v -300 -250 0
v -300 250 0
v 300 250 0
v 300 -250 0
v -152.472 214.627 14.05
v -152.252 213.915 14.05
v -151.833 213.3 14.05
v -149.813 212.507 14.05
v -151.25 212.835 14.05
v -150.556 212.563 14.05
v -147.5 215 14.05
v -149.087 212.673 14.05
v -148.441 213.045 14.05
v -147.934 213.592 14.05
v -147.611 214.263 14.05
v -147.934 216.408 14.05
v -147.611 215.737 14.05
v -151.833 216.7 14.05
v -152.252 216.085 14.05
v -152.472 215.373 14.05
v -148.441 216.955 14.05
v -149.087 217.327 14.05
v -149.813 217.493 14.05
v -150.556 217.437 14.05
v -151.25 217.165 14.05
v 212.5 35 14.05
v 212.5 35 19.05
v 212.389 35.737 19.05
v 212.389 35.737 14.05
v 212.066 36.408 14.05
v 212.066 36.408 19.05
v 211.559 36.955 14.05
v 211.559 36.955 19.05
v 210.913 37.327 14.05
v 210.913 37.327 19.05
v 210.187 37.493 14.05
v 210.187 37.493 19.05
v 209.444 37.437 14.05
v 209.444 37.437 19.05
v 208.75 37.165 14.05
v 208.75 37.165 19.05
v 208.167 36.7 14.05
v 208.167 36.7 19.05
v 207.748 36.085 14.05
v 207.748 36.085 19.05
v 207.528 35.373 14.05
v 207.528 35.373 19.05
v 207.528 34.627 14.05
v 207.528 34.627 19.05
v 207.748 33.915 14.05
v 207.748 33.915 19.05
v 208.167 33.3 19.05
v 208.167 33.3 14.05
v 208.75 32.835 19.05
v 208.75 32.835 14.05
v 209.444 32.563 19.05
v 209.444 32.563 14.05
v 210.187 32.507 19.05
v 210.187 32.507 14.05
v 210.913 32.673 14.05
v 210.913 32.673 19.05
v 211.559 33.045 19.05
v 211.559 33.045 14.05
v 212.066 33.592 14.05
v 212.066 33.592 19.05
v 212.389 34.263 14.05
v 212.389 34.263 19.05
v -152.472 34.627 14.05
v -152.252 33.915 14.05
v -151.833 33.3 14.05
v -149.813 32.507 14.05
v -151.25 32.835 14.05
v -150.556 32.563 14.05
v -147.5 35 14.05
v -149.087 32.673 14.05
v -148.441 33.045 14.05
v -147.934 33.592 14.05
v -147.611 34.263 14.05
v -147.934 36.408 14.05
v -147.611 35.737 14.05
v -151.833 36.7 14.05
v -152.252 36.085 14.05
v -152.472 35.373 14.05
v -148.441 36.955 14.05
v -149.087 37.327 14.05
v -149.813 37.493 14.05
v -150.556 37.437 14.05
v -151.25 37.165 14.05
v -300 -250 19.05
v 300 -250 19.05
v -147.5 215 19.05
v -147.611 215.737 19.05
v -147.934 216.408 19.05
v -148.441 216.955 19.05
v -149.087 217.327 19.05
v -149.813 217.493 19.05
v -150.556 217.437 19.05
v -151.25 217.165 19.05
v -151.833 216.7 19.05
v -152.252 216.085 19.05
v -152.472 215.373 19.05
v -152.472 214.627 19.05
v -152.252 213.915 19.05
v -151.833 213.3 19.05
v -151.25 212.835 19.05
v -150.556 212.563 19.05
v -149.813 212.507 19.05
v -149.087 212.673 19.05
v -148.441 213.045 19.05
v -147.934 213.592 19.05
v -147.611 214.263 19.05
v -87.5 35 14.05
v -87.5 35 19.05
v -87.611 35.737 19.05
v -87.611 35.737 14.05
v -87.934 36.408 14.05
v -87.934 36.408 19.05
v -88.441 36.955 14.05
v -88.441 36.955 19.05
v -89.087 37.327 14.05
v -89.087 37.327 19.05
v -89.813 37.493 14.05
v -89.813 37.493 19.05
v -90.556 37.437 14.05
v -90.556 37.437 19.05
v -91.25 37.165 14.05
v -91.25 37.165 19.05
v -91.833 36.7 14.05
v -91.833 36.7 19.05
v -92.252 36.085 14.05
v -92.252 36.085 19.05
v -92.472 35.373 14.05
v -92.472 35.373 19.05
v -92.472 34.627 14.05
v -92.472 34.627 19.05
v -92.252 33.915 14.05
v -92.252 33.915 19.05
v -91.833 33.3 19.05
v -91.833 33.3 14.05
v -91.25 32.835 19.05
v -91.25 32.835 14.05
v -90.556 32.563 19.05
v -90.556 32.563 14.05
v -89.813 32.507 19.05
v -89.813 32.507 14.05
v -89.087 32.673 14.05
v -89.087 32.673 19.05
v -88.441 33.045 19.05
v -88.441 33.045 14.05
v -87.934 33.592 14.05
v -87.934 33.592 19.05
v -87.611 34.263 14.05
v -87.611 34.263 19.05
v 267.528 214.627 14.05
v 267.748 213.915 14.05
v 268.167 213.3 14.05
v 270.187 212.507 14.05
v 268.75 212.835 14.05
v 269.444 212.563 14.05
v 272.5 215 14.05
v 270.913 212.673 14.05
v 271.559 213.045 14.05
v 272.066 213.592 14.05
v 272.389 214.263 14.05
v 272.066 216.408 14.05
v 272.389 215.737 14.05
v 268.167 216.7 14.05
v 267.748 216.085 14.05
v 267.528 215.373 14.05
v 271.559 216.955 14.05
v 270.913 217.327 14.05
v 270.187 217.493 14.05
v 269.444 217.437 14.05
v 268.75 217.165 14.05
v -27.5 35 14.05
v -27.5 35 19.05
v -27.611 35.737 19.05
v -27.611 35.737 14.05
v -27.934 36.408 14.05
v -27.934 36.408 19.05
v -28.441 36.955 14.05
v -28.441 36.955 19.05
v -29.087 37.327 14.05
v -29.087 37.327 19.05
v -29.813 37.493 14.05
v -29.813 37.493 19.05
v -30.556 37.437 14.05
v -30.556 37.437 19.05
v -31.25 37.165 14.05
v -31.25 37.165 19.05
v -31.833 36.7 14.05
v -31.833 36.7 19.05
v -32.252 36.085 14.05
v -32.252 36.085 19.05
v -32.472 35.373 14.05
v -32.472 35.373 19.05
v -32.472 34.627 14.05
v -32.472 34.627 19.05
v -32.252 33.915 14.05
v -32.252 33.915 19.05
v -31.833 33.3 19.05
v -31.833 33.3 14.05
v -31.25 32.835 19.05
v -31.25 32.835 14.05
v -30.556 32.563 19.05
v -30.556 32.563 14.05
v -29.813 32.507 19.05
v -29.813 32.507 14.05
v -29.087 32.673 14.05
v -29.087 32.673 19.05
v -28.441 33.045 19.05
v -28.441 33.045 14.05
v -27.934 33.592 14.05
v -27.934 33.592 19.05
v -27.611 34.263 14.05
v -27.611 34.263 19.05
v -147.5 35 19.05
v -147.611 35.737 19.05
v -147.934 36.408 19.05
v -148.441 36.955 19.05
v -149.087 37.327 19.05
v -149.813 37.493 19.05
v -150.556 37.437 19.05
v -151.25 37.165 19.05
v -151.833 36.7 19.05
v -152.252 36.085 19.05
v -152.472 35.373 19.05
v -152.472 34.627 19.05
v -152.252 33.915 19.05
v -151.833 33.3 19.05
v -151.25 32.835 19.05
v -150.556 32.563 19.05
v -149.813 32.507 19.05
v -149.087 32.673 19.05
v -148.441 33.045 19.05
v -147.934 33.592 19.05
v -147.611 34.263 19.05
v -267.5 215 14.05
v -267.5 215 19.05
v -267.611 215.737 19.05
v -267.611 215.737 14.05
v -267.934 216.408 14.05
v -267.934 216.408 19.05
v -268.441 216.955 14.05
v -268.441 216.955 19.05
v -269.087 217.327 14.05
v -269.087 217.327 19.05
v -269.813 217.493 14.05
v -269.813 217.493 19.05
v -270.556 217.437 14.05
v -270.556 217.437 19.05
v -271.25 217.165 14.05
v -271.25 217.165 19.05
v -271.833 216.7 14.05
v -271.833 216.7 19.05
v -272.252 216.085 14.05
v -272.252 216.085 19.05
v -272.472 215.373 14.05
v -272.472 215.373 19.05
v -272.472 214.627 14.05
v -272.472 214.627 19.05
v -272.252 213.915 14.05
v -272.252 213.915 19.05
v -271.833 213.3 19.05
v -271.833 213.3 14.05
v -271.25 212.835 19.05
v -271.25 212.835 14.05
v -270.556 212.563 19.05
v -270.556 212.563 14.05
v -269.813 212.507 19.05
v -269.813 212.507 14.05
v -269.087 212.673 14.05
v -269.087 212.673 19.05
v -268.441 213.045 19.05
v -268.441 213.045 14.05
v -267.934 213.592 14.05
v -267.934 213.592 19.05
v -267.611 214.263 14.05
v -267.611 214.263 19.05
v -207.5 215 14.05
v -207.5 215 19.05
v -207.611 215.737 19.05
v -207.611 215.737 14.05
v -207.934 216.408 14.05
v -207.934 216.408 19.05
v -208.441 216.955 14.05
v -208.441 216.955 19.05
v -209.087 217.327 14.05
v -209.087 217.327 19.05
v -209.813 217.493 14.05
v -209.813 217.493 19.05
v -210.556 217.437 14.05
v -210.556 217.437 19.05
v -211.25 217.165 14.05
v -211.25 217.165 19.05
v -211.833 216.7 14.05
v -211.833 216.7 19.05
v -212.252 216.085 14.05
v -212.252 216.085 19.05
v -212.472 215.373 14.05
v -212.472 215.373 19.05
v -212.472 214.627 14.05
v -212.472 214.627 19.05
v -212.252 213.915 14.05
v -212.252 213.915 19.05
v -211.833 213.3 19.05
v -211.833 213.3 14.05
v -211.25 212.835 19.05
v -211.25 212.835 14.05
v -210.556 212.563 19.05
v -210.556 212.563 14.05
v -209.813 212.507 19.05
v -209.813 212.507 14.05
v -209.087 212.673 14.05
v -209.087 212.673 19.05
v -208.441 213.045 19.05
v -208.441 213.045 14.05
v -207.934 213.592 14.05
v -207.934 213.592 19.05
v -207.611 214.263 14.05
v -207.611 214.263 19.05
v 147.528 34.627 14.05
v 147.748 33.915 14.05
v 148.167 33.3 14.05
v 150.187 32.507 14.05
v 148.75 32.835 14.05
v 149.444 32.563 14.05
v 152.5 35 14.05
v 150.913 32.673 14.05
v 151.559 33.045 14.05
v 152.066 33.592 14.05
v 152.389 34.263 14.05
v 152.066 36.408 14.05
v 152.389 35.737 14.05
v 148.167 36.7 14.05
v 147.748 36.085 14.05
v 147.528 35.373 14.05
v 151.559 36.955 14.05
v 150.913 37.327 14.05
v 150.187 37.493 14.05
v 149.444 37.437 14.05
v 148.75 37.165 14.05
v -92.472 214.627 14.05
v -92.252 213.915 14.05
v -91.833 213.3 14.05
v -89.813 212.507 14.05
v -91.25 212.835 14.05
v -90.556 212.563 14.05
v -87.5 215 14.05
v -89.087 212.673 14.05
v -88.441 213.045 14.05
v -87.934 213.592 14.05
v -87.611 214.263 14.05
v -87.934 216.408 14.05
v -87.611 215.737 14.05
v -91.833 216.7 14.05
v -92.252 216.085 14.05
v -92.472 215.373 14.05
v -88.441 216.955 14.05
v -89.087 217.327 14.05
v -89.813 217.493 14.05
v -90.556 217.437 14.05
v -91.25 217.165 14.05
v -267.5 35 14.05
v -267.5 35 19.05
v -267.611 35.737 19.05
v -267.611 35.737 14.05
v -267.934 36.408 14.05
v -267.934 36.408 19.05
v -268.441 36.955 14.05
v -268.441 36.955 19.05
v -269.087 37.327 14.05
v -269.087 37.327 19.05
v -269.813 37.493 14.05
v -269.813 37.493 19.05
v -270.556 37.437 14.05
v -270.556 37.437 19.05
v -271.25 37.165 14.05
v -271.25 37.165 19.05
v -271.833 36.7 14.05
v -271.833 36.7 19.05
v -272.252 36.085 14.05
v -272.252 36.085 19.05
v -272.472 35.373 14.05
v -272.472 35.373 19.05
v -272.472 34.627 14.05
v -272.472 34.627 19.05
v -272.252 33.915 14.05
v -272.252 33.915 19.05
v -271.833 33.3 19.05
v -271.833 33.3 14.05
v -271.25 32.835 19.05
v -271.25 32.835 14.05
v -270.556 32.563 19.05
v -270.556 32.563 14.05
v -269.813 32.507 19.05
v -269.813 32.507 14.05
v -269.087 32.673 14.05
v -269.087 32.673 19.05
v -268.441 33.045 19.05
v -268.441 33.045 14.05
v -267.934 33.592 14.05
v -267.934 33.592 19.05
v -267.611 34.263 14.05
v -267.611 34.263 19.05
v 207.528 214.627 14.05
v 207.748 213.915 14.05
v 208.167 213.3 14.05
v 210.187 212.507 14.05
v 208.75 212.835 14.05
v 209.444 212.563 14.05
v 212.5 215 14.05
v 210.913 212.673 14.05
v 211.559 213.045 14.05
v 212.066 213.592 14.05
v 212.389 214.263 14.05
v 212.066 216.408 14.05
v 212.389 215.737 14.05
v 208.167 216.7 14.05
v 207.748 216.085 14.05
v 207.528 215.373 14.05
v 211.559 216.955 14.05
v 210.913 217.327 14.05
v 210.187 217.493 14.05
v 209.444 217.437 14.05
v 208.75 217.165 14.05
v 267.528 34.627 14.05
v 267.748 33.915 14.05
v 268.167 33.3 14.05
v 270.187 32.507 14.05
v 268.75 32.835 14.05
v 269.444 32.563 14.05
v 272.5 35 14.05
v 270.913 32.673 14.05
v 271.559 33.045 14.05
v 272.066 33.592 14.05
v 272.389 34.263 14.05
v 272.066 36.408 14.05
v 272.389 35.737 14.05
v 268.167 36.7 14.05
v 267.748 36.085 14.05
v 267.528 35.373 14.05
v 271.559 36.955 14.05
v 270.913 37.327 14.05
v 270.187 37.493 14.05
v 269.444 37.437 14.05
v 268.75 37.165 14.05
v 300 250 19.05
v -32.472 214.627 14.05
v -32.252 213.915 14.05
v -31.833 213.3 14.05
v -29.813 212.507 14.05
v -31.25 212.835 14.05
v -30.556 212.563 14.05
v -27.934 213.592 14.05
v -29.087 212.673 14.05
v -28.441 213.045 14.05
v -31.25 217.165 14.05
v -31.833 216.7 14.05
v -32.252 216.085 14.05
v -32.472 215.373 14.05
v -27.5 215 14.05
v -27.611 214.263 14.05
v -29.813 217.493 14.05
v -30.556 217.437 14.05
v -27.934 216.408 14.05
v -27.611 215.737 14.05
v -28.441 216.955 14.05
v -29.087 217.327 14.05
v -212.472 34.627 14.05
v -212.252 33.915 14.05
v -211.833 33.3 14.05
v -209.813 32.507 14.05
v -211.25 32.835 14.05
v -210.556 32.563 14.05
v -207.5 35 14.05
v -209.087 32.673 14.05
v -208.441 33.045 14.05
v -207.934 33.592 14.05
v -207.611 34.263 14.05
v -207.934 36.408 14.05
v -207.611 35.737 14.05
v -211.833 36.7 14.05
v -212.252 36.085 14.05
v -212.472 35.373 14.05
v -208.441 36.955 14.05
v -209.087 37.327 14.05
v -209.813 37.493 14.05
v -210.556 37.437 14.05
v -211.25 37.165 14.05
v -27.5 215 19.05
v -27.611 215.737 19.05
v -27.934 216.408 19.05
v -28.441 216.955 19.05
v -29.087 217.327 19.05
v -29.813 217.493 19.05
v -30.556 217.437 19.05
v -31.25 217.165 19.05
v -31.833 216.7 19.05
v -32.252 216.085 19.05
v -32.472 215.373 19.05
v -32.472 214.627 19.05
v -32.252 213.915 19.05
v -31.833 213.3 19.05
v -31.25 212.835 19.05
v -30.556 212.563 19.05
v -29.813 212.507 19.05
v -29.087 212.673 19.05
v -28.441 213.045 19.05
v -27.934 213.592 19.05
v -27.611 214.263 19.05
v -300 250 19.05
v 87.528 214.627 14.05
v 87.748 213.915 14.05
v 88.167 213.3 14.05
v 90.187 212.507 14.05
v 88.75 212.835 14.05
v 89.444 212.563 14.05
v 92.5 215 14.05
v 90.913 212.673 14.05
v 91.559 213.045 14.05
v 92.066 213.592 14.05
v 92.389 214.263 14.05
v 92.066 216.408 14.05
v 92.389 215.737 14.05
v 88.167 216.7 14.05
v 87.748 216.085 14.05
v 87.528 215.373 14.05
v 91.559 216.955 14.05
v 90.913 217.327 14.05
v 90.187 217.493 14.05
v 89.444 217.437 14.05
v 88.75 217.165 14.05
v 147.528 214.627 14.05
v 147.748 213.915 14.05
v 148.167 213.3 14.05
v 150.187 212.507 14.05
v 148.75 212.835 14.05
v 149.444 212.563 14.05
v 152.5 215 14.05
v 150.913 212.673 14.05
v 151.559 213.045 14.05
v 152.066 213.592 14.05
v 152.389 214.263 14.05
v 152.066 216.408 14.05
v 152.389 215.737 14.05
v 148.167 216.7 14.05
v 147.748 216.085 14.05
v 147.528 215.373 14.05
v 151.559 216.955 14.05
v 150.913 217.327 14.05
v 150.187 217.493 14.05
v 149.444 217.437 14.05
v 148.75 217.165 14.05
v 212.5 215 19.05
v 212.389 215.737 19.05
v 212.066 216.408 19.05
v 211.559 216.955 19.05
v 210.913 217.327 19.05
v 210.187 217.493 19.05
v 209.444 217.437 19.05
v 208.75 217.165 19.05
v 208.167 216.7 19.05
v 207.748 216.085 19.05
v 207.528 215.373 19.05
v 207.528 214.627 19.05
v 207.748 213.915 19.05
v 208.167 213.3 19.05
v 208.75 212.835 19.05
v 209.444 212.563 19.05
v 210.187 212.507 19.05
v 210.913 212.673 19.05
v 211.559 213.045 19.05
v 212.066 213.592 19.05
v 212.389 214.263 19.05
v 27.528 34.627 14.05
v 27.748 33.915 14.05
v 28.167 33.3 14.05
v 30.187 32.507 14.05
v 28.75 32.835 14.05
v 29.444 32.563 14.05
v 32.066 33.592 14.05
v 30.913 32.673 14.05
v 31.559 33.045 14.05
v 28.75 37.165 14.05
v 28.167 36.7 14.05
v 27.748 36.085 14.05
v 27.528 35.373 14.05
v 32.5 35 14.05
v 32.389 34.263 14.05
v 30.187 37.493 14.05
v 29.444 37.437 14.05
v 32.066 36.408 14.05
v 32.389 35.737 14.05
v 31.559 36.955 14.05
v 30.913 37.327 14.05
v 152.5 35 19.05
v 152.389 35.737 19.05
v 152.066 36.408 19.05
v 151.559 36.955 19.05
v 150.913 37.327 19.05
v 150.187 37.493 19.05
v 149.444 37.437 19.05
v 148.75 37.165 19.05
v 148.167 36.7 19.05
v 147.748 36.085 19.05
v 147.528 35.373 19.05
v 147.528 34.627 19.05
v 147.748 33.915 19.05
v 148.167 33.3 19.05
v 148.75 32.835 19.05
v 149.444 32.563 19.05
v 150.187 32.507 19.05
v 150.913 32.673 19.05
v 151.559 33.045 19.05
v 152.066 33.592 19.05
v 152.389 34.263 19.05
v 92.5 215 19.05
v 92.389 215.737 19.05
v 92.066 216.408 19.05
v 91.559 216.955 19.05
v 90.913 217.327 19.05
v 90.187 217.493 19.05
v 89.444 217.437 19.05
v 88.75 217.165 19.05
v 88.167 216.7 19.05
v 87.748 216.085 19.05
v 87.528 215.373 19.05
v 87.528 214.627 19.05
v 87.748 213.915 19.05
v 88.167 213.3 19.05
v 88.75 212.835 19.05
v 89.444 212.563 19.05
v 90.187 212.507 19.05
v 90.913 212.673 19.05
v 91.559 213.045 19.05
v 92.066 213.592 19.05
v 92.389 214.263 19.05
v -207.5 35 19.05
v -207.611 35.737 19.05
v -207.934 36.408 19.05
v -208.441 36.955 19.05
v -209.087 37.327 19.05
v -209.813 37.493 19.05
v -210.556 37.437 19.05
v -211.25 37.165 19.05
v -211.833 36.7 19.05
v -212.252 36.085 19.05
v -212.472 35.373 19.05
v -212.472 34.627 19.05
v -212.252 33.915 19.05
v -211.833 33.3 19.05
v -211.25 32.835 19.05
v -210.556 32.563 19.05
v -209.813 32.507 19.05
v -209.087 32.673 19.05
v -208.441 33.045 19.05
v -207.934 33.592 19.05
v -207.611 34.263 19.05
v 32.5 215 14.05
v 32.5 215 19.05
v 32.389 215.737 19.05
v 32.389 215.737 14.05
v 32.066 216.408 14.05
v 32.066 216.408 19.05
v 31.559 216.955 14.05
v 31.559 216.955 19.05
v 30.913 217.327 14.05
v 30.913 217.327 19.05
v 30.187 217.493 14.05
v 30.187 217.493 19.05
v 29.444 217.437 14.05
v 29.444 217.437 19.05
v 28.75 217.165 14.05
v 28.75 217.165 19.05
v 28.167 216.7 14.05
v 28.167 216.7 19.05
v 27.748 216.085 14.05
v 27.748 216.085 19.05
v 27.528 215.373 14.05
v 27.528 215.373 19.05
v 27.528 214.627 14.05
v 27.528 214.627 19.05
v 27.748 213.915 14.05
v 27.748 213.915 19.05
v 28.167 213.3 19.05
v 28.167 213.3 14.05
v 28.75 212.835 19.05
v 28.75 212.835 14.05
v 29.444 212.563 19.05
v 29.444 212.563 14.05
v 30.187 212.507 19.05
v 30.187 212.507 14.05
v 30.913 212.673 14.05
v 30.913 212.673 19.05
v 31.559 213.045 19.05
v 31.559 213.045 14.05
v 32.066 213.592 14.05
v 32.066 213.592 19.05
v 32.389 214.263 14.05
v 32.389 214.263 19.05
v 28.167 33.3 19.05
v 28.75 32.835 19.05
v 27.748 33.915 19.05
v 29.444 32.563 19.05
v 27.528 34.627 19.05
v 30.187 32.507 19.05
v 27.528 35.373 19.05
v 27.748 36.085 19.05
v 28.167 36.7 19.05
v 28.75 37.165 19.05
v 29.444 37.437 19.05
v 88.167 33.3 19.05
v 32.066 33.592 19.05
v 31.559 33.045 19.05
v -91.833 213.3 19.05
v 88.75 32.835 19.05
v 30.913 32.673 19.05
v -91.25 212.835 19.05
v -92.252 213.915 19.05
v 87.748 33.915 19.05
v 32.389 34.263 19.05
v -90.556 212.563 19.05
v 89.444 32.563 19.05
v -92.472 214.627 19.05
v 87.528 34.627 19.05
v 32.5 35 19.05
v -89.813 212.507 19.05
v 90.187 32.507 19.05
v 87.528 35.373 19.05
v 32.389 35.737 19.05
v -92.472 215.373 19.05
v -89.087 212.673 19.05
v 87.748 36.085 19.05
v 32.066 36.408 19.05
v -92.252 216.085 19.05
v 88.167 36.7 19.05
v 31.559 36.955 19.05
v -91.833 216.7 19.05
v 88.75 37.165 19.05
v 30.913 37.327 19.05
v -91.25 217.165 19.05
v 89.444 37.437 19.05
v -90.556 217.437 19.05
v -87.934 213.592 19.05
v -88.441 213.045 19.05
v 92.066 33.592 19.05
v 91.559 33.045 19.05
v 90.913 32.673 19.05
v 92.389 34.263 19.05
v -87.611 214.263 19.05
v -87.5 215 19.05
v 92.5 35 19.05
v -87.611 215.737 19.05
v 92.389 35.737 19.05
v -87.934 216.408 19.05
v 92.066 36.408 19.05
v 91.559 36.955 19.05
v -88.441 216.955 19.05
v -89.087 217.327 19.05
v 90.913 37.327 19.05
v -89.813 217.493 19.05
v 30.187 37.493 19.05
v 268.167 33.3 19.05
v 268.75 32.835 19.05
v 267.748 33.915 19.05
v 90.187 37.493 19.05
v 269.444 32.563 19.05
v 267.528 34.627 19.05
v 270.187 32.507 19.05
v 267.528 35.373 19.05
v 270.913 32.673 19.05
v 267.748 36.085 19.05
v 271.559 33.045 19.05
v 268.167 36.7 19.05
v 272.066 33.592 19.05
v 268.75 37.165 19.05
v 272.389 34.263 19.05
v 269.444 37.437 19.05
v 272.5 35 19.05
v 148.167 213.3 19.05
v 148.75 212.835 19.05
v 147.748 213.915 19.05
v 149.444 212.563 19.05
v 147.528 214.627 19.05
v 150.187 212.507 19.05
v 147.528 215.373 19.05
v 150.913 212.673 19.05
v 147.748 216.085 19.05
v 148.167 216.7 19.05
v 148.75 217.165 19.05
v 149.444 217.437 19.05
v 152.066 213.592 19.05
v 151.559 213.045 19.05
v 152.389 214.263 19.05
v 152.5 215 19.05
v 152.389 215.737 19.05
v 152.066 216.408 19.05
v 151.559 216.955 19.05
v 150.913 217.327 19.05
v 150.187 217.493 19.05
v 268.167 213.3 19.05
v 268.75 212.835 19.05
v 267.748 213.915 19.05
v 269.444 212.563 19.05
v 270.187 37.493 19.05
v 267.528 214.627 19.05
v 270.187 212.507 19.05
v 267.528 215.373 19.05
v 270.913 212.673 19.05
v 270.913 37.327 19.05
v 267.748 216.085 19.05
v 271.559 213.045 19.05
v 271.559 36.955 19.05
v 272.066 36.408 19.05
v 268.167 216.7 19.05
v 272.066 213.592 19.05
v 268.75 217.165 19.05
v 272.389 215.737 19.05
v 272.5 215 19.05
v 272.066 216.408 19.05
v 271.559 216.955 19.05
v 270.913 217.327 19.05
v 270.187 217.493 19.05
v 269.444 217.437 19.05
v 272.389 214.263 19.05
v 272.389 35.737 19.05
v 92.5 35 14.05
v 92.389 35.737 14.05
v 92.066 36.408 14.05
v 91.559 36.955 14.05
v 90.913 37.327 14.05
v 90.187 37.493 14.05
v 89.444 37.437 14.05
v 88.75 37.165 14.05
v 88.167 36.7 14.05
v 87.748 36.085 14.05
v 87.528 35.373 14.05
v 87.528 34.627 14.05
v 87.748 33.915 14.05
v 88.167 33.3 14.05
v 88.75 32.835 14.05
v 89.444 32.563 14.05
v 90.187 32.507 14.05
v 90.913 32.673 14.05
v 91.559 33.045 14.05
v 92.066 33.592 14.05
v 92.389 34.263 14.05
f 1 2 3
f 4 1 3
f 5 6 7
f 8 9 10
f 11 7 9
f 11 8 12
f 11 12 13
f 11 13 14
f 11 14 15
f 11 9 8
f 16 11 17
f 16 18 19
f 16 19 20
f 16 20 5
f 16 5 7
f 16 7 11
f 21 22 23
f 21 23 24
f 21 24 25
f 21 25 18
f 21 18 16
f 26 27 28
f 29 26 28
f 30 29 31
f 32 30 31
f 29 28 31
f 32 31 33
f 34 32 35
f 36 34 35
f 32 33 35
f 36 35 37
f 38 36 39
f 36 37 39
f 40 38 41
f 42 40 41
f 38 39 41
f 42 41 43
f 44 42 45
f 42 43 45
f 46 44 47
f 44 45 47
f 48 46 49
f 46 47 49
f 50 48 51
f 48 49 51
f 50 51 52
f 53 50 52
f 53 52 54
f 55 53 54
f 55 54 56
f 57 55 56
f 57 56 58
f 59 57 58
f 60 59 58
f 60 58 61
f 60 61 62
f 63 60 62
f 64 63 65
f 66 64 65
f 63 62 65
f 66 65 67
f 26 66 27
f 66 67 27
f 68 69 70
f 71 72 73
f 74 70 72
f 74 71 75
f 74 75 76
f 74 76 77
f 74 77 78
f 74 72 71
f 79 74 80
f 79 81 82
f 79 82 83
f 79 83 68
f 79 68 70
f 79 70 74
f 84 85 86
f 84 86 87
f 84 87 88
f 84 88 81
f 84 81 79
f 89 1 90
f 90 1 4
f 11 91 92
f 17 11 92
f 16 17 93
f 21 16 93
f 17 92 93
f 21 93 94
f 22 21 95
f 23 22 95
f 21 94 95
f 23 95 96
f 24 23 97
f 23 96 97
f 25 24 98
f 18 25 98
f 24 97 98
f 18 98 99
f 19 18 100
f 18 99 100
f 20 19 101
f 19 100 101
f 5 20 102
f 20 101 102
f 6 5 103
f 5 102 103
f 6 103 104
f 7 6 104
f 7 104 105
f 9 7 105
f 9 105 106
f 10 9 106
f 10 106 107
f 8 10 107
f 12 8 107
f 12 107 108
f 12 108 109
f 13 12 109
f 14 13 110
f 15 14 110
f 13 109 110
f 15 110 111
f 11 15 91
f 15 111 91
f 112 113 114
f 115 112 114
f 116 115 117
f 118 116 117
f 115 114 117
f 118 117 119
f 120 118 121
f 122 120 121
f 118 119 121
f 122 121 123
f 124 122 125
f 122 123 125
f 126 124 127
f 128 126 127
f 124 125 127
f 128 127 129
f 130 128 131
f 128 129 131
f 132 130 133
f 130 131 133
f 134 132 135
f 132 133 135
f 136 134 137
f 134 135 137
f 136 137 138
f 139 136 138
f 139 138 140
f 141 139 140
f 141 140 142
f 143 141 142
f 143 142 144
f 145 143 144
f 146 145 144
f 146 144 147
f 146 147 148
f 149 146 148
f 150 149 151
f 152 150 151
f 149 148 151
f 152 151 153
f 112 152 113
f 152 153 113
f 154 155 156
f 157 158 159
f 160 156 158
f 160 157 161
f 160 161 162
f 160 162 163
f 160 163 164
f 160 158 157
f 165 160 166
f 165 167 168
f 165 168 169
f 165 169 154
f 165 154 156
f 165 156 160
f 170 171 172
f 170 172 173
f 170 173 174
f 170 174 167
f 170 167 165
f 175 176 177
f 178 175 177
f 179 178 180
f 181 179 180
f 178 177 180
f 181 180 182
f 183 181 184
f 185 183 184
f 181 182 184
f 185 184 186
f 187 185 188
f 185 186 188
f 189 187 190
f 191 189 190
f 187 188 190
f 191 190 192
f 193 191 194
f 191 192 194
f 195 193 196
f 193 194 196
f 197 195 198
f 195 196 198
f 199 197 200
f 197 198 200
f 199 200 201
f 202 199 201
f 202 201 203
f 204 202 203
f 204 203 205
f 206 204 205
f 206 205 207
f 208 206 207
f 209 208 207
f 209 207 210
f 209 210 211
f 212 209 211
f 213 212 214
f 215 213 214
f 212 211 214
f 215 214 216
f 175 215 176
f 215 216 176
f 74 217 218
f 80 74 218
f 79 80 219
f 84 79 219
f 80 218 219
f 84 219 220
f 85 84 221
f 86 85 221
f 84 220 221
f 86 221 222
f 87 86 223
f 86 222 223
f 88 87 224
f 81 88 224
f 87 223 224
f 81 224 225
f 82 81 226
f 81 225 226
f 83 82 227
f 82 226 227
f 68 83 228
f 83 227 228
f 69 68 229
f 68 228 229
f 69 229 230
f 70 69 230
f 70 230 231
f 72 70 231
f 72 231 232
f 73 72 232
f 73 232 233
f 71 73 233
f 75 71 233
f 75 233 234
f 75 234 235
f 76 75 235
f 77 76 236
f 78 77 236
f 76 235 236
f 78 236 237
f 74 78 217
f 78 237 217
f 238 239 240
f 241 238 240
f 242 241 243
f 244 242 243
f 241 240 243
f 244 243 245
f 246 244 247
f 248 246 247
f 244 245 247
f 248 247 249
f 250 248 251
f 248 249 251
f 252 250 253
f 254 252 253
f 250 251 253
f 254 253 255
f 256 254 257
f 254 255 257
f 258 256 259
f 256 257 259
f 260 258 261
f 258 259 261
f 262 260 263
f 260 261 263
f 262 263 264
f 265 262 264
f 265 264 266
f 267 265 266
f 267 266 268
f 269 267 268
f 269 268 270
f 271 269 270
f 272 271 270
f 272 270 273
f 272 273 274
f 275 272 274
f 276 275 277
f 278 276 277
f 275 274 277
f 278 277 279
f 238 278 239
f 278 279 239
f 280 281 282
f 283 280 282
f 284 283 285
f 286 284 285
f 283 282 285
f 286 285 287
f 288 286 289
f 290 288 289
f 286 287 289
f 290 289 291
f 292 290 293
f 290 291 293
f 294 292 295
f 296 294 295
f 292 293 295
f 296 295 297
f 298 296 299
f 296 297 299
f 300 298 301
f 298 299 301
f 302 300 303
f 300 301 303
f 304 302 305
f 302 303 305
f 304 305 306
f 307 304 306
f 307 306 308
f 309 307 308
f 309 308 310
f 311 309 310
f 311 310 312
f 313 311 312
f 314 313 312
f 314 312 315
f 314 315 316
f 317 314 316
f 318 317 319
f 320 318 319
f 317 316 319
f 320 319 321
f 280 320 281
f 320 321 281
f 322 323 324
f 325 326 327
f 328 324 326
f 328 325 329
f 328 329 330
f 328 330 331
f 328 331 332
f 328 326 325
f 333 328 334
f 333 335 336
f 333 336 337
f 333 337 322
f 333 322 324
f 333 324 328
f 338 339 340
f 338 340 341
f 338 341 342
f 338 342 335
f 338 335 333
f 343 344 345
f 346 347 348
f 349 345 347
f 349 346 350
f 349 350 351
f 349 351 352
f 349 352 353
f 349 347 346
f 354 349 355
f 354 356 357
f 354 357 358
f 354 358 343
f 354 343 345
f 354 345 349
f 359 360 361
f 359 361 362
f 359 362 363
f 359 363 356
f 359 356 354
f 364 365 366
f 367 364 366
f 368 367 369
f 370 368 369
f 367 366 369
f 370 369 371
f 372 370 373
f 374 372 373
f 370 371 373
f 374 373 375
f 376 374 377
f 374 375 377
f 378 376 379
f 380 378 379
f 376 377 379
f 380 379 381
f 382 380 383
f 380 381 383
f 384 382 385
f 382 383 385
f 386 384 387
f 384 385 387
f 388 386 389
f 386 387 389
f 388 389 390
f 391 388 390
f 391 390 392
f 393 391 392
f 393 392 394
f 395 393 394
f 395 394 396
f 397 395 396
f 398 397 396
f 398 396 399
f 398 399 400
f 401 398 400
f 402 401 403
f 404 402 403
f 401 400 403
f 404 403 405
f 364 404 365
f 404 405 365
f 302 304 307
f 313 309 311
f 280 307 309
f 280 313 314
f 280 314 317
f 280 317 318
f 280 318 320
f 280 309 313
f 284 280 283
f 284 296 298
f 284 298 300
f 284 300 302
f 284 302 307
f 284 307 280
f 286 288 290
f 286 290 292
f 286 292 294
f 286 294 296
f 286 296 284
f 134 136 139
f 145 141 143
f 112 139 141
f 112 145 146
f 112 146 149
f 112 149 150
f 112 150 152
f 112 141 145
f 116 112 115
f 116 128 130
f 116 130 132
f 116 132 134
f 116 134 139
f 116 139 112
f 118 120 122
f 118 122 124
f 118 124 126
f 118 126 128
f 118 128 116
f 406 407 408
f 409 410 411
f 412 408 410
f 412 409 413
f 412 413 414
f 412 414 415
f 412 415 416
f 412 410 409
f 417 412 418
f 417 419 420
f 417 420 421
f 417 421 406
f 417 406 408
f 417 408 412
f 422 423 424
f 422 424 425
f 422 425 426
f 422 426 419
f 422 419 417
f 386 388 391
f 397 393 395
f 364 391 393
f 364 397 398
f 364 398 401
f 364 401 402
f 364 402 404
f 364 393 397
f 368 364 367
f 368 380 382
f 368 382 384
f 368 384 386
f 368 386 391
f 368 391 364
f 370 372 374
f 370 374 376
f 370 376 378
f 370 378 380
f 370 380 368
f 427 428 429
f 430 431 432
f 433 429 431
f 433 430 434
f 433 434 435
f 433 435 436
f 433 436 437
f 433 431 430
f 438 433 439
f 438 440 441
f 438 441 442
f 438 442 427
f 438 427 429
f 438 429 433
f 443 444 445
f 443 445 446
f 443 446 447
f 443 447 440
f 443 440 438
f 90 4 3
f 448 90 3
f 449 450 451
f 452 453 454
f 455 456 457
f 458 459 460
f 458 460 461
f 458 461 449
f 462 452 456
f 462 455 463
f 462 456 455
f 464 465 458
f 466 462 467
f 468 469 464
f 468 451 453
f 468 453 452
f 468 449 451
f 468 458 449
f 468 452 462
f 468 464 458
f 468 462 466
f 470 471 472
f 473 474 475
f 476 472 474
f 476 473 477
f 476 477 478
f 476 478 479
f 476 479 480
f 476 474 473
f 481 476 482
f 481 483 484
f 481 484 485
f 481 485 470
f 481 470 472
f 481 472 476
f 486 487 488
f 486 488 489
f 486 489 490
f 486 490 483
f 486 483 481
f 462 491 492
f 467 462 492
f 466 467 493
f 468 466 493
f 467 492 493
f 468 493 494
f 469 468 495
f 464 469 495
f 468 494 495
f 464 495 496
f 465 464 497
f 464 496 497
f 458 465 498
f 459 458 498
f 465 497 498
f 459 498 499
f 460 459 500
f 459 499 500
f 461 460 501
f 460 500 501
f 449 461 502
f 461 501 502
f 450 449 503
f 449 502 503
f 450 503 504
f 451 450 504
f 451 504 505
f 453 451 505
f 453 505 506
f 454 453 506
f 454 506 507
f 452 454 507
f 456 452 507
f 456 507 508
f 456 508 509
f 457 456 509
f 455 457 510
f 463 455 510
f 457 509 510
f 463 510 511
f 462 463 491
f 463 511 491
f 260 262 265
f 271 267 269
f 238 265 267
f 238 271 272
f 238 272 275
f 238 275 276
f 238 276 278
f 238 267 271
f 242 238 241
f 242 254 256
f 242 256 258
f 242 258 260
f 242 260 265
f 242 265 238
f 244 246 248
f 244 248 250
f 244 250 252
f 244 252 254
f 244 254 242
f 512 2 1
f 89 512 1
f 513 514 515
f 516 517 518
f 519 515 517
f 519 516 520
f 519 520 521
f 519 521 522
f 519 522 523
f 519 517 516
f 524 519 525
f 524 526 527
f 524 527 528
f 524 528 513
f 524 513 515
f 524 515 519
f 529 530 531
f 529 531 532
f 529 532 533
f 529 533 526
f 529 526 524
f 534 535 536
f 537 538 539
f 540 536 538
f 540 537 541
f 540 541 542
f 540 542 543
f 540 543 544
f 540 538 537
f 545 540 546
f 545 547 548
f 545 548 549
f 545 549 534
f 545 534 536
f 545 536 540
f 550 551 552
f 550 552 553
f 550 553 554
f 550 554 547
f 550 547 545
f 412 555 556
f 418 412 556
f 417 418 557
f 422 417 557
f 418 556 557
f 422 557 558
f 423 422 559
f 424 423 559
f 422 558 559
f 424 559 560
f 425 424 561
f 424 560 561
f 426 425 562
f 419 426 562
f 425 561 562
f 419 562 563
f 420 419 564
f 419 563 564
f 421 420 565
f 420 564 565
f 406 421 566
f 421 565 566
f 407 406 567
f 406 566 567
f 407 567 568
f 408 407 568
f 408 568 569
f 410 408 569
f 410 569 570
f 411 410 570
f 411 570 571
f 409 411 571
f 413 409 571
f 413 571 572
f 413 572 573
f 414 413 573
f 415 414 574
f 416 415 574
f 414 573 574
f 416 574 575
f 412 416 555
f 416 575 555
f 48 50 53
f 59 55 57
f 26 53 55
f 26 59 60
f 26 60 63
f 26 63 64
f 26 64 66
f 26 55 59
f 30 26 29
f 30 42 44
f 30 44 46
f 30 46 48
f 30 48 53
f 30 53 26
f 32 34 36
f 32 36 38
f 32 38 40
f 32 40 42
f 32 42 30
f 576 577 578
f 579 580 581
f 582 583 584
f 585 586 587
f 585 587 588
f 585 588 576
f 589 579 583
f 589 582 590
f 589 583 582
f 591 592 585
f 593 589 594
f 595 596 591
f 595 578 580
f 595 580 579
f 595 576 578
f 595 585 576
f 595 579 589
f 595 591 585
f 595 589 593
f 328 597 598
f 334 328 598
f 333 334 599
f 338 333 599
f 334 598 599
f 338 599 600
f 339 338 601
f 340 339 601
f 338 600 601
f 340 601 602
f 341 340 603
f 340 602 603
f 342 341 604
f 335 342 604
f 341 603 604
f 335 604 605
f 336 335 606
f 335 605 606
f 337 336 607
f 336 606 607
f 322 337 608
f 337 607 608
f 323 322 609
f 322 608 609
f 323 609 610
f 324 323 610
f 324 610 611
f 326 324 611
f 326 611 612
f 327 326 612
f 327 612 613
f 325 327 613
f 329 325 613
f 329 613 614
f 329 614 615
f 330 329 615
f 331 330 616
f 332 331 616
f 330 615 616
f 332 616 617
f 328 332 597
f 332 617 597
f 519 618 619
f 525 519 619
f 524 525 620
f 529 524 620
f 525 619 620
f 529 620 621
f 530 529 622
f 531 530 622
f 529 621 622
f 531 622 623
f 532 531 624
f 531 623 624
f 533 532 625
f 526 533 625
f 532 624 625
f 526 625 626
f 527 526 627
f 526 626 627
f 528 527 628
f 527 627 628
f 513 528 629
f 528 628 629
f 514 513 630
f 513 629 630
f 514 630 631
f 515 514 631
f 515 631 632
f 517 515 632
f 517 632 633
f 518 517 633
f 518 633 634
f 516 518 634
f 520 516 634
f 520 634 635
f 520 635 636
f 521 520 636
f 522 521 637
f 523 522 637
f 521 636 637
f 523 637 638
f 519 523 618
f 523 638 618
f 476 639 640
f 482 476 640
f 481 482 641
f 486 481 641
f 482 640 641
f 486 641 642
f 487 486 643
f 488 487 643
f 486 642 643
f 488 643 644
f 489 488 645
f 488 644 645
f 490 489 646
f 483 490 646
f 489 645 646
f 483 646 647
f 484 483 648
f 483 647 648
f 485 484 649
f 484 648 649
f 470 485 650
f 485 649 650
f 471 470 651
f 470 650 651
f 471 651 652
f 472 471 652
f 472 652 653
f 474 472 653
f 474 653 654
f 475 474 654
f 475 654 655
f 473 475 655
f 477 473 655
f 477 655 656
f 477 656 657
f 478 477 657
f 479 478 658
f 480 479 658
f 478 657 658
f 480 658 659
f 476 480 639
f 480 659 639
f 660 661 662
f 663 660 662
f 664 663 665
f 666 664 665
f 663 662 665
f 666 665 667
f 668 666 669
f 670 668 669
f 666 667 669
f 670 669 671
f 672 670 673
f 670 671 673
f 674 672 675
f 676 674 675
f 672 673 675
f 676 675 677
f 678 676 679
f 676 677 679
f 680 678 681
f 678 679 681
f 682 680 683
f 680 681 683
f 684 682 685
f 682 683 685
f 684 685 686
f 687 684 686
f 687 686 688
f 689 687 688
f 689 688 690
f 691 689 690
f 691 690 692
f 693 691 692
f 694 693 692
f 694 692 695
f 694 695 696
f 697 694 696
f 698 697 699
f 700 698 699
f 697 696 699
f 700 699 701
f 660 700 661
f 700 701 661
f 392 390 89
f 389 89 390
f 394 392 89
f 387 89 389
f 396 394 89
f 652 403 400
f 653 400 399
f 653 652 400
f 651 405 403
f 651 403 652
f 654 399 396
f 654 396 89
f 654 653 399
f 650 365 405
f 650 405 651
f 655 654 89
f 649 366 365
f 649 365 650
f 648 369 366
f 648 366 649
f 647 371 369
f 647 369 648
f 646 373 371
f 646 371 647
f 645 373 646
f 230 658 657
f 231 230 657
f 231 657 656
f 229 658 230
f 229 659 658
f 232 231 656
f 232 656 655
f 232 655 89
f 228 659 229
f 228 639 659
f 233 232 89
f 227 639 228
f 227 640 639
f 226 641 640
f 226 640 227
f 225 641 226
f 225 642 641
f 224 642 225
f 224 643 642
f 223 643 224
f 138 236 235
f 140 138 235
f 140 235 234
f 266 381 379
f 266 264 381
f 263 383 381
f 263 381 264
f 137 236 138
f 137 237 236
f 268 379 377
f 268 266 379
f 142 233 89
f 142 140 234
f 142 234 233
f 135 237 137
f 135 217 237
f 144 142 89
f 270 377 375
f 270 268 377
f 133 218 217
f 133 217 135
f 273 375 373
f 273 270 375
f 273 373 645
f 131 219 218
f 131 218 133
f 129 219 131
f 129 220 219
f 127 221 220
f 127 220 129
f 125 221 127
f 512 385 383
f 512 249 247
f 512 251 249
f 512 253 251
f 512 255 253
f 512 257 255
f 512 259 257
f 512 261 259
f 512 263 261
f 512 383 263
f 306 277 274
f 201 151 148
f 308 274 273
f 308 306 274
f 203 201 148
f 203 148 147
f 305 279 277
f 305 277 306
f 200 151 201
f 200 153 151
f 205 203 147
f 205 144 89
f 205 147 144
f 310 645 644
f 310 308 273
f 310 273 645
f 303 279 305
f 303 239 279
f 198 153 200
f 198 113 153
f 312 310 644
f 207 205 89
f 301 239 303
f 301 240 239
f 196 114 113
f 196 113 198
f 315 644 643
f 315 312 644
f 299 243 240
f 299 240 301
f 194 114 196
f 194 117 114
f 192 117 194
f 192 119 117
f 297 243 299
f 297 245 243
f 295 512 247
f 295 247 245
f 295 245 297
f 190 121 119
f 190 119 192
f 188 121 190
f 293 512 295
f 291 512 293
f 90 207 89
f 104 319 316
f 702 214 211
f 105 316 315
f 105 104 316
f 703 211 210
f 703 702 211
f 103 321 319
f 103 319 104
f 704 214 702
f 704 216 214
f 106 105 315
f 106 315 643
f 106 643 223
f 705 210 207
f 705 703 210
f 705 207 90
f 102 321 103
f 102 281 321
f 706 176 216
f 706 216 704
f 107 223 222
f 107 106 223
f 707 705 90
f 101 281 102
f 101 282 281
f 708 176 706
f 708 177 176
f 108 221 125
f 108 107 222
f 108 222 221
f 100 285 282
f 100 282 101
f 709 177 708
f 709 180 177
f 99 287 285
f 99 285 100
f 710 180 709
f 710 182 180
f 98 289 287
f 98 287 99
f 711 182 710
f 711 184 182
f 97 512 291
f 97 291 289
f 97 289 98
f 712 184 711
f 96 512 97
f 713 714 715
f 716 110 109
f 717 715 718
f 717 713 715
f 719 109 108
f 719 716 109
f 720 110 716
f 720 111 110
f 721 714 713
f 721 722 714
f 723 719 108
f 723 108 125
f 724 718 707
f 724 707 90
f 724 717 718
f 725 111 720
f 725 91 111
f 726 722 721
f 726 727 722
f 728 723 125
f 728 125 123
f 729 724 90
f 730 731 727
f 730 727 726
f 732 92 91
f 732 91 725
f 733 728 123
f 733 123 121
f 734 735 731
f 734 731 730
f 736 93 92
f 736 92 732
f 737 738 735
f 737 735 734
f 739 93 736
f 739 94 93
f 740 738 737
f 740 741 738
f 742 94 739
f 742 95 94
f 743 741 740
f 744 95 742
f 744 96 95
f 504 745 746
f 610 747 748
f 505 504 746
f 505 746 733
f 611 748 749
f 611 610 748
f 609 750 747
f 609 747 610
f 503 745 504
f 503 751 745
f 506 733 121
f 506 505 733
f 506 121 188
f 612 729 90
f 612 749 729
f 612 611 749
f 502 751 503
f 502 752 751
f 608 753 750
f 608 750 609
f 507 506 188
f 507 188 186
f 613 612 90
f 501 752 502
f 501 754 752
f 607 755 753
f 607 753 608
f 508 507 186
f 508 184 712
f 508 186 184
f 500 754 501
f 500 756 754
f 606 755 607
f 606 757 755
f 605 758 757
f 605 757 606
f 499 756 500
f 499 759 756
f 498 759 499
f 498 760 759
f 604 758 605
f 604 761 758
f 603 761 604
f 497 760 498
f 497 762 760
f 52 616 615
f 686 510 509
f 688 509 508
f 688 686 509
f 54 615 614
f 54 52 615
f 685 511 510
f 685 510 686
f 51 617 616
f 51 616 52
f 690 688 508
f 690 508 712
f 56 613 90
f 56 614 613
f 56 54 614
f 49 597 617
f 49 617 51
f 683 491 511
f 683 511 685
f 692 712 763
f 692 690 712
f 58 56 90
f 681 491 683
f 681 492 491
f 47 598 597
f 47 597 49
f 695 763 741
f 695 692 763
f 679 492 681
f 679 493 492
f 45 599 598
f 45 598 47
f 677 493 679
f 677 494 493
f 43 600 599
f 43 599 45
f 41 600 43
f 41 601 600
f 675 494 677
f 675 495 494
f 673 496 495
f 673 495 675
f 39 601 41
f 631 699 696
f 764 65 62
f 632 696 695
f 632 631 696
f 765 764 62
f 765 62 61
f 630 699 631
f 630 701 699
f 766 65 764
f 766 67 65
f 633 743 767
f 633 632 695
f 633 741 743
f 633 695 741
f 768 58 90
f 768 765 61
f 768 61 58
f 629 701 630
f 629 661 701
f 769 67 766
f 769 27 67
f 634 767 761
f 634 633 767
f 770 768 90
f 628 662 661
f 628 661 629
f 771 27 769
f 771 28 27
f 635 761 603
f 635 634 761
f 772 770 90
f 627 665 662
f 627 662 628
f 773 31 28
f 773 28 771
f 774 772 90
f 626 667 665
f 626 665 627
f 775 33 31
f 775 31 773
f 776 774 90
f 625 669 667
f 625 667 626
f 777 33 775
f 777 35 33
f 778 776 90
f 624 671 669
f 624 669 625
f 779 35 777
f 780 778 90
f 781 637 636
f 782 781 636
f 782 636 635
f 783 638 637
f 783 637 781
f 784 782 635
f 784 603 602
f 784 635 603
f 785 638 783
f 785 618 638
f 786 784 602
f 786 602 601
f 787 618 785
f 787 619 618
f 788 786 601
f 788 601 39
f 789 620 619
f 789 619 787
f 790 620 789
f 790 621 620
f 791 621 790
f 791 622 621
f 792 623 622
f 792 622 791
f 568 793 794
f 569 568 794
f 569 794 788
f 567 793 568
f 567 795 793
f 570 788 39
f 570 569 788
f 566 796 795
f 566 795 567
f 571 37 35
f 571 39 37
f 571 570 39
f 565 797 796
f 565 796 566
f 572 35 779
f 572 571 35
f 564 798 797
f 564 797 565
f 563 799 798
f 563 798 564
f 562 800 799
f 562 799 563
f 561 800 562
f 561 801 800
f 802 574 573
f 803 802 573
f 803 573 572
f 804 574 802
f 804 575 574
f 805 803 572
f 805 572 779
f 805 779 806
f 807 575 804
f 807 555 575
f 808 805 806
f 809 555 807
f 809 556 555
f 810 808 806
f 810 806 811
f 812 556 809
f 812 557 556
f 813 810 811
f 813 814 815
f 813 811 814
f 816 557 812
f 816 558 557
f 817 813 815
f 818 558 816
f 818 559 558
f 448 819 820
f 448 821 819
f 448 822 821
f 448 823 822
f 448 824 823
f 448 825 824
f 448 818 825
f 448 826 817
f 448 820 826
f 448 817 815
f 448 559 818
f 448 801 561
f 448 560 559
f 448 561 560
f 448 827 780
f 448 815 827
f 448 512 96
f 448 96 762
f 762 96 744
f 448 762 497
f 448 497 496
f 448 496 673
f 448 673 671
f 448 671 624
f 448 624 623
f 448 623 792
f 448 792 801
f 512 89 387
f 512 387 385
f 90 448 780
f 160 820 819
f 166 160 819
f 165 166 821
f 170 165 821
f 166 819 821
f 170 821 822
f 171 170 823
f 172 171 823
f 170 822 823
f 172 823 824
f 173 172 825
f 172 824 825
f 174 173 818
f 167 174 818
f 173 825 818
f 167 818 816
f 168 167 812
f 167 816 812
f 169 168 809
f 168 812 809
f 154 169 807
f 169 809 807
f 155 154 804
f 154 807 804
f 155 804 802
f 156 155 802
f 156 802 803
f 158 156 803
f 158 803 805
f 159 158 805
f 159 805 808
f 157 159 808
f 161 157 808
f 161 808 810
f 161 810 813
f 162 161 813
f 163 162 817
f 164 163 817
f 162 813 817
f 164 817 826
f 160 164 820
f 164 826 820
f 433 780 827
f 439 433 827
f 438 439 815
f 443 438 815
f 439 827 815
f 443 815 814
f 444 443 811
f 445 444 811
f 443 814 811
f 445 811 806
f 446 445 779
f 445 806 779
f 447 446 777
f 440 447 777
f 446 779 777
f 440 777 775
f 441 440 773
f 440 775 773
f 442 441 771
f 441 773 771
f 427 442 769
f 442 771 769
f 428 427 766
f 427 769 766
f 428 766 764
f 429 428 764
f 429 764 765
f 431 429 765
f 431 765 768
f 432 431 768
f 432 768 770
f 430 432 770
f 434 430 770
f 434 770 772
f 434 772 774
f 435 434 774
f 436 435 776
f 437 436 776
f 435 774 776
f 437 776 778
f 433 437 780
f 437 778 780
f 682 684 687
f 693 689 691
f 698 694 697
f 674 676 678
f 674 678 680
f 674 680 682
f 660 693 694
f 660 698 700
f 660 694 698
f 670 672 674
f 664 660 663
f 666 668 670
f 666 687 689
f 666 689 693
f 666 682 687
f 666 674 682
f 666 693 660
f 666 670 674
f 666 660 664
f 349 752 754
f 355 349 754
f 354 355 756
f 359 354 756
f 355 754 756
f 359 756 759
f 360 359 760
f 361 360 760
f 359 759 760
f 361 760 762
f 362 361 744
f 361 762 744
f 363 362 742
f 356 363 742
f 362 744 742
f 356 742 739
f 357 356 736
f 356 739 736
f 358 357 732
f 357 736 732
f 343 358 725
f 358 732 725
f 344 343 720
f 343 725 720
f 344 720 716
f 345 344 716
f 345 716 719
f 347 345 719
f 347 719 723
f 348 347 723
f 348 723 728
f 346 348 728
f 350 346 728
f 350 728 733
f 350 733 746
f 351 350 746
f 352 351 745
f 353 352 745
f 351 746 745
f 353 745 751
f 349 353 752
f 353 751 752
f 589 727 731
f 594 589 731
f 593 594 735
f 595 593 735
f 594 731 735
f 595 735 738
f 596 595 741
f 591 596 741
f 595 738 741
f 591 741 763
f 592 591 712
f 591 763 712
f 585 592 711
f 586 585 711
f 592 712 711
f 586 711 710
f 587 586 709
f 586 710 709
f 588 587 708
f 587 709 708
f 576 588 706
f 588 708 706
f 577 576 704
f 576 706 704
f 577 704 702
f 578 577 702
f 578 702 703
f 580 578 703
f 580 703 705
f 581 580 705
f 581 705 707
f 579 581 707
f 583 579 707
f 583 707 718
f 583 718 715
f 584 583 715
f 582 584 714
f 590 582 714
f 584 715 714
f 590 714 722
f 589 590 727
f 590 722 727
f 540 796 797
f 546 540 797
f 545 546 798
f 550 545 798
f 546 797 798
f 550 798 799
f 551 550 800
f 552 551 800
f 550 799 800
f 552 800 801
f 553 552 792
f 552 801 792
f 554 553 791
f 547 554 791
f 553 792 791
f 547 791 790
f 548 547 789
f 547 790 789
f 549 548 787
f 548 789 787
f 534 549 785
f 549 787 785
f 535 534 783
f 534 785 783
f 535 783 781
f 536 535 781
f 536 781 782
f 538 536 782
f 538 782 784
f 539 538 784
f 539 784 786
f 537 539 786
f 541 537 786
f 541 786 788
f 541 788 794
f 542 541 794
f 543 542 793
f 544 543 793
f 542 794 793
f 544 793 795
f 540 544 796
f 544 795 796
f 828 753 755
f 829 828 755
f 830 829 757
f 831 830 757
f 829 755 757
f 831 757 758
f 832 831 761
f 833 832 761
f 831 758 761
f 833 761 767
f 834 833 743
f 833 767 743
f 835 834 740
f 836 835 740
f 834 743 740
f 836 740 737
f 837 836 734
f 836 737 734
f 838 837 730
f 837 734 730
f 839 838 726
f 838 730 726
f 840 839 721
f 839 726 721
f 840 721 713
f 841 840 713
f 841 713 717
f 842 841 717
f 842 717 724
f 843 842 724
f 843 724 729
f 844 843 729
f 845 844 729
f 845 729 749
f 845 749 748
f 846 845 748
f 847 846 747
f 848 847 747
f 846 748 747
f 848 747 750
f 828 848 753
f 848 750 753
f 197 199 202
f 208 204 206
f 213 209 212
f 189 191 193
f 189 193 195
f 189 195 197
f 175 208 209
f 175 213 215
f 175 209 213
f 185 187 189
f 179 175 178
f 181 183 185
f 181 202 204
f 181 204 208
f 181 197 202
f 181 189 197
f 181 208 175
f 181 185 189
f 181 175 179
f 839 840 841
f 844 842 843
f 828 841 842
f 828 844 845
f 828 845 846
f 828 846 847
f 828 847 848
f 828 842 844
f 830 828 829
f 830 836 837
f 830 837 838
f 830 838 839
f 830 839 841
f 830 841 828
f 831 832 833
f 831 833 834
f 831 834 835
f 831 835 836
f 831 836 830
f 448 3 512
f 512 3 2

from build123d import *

# Parameters (mm, degrees)
BOSS_EXTRUDE1_DEPTH = 19.05
SKETCH2_R           = 2.5
CUT_EXTRUDE1_DEPTH  = 5


with BuildPart() as part:
    # Sketch1 → Boss-Extrude1 (new body)
    with BuildSketch(Plane.XY):
        Polygon((300, 185), (300, 250), (-300, 250), (-300, -250), (300, -250), align=None)
    extrude(amount=BOSS_EXTRUDE1_DEPTH)

    # Sketch2 → Cut-Extrude1 (cut)
    with BuildSketch(Plane.XY.offset(19.05)):
        with Locations((270, 35)):
            Circle(SKETCH2_R)
        with Locations((210, 35)):
            Circle(SKETCH2_R)
        with Locations((150, 35)):
            Circle(SKETCH2_R)
        with Locations((90, 35)):
            Circle(SKETCH2_R)
        with Locations((30, 35)):
            Circle(SKETCH2_R)
        with Locations((-30, 35)):
            Circle(SKETCH2_R)
        with Locations((-90, 35)):
            Circle(SKETCH2_R)
        with Locations((-150, 35)):
            Circle(SKETCH2_R)
        with Locations((-210, 35)):
            Circle(SKETCH2_R)
        with Locations((-270, 35)):
            Circle(SKETCH2_R)
        with Locations((-270, 215)):
            Circle(SKETCH2_R)
        with Locations((-210, 215)):
            Circle(SKETCH2_R)
        with Locations((-150, 215)):
            Circle(SKETCH2_R)
        with Locations((-90, 215)):
            Circle(SKETCH2_R)
        with Locations((-30, 215)):
            Circle(SKETCH2_R)
        with Locations((30, 215)):
            Circle(SKETCH2_R)
        with Locations((90, 215)):
            Circle(SKETCH2_R)
        with Locations((150, 215)):
            Circle(SKETCH2_R)
        with Locations((210, 215)):
            Circle(SKETCH2_R)
        with Locations((270, 215)):
            Circle(SKETCH2_R)
    extrude(amount=-CUT_EXTRUDE1_DEPTH, mode=Mode.SUBTRACT)


solid = part.part
